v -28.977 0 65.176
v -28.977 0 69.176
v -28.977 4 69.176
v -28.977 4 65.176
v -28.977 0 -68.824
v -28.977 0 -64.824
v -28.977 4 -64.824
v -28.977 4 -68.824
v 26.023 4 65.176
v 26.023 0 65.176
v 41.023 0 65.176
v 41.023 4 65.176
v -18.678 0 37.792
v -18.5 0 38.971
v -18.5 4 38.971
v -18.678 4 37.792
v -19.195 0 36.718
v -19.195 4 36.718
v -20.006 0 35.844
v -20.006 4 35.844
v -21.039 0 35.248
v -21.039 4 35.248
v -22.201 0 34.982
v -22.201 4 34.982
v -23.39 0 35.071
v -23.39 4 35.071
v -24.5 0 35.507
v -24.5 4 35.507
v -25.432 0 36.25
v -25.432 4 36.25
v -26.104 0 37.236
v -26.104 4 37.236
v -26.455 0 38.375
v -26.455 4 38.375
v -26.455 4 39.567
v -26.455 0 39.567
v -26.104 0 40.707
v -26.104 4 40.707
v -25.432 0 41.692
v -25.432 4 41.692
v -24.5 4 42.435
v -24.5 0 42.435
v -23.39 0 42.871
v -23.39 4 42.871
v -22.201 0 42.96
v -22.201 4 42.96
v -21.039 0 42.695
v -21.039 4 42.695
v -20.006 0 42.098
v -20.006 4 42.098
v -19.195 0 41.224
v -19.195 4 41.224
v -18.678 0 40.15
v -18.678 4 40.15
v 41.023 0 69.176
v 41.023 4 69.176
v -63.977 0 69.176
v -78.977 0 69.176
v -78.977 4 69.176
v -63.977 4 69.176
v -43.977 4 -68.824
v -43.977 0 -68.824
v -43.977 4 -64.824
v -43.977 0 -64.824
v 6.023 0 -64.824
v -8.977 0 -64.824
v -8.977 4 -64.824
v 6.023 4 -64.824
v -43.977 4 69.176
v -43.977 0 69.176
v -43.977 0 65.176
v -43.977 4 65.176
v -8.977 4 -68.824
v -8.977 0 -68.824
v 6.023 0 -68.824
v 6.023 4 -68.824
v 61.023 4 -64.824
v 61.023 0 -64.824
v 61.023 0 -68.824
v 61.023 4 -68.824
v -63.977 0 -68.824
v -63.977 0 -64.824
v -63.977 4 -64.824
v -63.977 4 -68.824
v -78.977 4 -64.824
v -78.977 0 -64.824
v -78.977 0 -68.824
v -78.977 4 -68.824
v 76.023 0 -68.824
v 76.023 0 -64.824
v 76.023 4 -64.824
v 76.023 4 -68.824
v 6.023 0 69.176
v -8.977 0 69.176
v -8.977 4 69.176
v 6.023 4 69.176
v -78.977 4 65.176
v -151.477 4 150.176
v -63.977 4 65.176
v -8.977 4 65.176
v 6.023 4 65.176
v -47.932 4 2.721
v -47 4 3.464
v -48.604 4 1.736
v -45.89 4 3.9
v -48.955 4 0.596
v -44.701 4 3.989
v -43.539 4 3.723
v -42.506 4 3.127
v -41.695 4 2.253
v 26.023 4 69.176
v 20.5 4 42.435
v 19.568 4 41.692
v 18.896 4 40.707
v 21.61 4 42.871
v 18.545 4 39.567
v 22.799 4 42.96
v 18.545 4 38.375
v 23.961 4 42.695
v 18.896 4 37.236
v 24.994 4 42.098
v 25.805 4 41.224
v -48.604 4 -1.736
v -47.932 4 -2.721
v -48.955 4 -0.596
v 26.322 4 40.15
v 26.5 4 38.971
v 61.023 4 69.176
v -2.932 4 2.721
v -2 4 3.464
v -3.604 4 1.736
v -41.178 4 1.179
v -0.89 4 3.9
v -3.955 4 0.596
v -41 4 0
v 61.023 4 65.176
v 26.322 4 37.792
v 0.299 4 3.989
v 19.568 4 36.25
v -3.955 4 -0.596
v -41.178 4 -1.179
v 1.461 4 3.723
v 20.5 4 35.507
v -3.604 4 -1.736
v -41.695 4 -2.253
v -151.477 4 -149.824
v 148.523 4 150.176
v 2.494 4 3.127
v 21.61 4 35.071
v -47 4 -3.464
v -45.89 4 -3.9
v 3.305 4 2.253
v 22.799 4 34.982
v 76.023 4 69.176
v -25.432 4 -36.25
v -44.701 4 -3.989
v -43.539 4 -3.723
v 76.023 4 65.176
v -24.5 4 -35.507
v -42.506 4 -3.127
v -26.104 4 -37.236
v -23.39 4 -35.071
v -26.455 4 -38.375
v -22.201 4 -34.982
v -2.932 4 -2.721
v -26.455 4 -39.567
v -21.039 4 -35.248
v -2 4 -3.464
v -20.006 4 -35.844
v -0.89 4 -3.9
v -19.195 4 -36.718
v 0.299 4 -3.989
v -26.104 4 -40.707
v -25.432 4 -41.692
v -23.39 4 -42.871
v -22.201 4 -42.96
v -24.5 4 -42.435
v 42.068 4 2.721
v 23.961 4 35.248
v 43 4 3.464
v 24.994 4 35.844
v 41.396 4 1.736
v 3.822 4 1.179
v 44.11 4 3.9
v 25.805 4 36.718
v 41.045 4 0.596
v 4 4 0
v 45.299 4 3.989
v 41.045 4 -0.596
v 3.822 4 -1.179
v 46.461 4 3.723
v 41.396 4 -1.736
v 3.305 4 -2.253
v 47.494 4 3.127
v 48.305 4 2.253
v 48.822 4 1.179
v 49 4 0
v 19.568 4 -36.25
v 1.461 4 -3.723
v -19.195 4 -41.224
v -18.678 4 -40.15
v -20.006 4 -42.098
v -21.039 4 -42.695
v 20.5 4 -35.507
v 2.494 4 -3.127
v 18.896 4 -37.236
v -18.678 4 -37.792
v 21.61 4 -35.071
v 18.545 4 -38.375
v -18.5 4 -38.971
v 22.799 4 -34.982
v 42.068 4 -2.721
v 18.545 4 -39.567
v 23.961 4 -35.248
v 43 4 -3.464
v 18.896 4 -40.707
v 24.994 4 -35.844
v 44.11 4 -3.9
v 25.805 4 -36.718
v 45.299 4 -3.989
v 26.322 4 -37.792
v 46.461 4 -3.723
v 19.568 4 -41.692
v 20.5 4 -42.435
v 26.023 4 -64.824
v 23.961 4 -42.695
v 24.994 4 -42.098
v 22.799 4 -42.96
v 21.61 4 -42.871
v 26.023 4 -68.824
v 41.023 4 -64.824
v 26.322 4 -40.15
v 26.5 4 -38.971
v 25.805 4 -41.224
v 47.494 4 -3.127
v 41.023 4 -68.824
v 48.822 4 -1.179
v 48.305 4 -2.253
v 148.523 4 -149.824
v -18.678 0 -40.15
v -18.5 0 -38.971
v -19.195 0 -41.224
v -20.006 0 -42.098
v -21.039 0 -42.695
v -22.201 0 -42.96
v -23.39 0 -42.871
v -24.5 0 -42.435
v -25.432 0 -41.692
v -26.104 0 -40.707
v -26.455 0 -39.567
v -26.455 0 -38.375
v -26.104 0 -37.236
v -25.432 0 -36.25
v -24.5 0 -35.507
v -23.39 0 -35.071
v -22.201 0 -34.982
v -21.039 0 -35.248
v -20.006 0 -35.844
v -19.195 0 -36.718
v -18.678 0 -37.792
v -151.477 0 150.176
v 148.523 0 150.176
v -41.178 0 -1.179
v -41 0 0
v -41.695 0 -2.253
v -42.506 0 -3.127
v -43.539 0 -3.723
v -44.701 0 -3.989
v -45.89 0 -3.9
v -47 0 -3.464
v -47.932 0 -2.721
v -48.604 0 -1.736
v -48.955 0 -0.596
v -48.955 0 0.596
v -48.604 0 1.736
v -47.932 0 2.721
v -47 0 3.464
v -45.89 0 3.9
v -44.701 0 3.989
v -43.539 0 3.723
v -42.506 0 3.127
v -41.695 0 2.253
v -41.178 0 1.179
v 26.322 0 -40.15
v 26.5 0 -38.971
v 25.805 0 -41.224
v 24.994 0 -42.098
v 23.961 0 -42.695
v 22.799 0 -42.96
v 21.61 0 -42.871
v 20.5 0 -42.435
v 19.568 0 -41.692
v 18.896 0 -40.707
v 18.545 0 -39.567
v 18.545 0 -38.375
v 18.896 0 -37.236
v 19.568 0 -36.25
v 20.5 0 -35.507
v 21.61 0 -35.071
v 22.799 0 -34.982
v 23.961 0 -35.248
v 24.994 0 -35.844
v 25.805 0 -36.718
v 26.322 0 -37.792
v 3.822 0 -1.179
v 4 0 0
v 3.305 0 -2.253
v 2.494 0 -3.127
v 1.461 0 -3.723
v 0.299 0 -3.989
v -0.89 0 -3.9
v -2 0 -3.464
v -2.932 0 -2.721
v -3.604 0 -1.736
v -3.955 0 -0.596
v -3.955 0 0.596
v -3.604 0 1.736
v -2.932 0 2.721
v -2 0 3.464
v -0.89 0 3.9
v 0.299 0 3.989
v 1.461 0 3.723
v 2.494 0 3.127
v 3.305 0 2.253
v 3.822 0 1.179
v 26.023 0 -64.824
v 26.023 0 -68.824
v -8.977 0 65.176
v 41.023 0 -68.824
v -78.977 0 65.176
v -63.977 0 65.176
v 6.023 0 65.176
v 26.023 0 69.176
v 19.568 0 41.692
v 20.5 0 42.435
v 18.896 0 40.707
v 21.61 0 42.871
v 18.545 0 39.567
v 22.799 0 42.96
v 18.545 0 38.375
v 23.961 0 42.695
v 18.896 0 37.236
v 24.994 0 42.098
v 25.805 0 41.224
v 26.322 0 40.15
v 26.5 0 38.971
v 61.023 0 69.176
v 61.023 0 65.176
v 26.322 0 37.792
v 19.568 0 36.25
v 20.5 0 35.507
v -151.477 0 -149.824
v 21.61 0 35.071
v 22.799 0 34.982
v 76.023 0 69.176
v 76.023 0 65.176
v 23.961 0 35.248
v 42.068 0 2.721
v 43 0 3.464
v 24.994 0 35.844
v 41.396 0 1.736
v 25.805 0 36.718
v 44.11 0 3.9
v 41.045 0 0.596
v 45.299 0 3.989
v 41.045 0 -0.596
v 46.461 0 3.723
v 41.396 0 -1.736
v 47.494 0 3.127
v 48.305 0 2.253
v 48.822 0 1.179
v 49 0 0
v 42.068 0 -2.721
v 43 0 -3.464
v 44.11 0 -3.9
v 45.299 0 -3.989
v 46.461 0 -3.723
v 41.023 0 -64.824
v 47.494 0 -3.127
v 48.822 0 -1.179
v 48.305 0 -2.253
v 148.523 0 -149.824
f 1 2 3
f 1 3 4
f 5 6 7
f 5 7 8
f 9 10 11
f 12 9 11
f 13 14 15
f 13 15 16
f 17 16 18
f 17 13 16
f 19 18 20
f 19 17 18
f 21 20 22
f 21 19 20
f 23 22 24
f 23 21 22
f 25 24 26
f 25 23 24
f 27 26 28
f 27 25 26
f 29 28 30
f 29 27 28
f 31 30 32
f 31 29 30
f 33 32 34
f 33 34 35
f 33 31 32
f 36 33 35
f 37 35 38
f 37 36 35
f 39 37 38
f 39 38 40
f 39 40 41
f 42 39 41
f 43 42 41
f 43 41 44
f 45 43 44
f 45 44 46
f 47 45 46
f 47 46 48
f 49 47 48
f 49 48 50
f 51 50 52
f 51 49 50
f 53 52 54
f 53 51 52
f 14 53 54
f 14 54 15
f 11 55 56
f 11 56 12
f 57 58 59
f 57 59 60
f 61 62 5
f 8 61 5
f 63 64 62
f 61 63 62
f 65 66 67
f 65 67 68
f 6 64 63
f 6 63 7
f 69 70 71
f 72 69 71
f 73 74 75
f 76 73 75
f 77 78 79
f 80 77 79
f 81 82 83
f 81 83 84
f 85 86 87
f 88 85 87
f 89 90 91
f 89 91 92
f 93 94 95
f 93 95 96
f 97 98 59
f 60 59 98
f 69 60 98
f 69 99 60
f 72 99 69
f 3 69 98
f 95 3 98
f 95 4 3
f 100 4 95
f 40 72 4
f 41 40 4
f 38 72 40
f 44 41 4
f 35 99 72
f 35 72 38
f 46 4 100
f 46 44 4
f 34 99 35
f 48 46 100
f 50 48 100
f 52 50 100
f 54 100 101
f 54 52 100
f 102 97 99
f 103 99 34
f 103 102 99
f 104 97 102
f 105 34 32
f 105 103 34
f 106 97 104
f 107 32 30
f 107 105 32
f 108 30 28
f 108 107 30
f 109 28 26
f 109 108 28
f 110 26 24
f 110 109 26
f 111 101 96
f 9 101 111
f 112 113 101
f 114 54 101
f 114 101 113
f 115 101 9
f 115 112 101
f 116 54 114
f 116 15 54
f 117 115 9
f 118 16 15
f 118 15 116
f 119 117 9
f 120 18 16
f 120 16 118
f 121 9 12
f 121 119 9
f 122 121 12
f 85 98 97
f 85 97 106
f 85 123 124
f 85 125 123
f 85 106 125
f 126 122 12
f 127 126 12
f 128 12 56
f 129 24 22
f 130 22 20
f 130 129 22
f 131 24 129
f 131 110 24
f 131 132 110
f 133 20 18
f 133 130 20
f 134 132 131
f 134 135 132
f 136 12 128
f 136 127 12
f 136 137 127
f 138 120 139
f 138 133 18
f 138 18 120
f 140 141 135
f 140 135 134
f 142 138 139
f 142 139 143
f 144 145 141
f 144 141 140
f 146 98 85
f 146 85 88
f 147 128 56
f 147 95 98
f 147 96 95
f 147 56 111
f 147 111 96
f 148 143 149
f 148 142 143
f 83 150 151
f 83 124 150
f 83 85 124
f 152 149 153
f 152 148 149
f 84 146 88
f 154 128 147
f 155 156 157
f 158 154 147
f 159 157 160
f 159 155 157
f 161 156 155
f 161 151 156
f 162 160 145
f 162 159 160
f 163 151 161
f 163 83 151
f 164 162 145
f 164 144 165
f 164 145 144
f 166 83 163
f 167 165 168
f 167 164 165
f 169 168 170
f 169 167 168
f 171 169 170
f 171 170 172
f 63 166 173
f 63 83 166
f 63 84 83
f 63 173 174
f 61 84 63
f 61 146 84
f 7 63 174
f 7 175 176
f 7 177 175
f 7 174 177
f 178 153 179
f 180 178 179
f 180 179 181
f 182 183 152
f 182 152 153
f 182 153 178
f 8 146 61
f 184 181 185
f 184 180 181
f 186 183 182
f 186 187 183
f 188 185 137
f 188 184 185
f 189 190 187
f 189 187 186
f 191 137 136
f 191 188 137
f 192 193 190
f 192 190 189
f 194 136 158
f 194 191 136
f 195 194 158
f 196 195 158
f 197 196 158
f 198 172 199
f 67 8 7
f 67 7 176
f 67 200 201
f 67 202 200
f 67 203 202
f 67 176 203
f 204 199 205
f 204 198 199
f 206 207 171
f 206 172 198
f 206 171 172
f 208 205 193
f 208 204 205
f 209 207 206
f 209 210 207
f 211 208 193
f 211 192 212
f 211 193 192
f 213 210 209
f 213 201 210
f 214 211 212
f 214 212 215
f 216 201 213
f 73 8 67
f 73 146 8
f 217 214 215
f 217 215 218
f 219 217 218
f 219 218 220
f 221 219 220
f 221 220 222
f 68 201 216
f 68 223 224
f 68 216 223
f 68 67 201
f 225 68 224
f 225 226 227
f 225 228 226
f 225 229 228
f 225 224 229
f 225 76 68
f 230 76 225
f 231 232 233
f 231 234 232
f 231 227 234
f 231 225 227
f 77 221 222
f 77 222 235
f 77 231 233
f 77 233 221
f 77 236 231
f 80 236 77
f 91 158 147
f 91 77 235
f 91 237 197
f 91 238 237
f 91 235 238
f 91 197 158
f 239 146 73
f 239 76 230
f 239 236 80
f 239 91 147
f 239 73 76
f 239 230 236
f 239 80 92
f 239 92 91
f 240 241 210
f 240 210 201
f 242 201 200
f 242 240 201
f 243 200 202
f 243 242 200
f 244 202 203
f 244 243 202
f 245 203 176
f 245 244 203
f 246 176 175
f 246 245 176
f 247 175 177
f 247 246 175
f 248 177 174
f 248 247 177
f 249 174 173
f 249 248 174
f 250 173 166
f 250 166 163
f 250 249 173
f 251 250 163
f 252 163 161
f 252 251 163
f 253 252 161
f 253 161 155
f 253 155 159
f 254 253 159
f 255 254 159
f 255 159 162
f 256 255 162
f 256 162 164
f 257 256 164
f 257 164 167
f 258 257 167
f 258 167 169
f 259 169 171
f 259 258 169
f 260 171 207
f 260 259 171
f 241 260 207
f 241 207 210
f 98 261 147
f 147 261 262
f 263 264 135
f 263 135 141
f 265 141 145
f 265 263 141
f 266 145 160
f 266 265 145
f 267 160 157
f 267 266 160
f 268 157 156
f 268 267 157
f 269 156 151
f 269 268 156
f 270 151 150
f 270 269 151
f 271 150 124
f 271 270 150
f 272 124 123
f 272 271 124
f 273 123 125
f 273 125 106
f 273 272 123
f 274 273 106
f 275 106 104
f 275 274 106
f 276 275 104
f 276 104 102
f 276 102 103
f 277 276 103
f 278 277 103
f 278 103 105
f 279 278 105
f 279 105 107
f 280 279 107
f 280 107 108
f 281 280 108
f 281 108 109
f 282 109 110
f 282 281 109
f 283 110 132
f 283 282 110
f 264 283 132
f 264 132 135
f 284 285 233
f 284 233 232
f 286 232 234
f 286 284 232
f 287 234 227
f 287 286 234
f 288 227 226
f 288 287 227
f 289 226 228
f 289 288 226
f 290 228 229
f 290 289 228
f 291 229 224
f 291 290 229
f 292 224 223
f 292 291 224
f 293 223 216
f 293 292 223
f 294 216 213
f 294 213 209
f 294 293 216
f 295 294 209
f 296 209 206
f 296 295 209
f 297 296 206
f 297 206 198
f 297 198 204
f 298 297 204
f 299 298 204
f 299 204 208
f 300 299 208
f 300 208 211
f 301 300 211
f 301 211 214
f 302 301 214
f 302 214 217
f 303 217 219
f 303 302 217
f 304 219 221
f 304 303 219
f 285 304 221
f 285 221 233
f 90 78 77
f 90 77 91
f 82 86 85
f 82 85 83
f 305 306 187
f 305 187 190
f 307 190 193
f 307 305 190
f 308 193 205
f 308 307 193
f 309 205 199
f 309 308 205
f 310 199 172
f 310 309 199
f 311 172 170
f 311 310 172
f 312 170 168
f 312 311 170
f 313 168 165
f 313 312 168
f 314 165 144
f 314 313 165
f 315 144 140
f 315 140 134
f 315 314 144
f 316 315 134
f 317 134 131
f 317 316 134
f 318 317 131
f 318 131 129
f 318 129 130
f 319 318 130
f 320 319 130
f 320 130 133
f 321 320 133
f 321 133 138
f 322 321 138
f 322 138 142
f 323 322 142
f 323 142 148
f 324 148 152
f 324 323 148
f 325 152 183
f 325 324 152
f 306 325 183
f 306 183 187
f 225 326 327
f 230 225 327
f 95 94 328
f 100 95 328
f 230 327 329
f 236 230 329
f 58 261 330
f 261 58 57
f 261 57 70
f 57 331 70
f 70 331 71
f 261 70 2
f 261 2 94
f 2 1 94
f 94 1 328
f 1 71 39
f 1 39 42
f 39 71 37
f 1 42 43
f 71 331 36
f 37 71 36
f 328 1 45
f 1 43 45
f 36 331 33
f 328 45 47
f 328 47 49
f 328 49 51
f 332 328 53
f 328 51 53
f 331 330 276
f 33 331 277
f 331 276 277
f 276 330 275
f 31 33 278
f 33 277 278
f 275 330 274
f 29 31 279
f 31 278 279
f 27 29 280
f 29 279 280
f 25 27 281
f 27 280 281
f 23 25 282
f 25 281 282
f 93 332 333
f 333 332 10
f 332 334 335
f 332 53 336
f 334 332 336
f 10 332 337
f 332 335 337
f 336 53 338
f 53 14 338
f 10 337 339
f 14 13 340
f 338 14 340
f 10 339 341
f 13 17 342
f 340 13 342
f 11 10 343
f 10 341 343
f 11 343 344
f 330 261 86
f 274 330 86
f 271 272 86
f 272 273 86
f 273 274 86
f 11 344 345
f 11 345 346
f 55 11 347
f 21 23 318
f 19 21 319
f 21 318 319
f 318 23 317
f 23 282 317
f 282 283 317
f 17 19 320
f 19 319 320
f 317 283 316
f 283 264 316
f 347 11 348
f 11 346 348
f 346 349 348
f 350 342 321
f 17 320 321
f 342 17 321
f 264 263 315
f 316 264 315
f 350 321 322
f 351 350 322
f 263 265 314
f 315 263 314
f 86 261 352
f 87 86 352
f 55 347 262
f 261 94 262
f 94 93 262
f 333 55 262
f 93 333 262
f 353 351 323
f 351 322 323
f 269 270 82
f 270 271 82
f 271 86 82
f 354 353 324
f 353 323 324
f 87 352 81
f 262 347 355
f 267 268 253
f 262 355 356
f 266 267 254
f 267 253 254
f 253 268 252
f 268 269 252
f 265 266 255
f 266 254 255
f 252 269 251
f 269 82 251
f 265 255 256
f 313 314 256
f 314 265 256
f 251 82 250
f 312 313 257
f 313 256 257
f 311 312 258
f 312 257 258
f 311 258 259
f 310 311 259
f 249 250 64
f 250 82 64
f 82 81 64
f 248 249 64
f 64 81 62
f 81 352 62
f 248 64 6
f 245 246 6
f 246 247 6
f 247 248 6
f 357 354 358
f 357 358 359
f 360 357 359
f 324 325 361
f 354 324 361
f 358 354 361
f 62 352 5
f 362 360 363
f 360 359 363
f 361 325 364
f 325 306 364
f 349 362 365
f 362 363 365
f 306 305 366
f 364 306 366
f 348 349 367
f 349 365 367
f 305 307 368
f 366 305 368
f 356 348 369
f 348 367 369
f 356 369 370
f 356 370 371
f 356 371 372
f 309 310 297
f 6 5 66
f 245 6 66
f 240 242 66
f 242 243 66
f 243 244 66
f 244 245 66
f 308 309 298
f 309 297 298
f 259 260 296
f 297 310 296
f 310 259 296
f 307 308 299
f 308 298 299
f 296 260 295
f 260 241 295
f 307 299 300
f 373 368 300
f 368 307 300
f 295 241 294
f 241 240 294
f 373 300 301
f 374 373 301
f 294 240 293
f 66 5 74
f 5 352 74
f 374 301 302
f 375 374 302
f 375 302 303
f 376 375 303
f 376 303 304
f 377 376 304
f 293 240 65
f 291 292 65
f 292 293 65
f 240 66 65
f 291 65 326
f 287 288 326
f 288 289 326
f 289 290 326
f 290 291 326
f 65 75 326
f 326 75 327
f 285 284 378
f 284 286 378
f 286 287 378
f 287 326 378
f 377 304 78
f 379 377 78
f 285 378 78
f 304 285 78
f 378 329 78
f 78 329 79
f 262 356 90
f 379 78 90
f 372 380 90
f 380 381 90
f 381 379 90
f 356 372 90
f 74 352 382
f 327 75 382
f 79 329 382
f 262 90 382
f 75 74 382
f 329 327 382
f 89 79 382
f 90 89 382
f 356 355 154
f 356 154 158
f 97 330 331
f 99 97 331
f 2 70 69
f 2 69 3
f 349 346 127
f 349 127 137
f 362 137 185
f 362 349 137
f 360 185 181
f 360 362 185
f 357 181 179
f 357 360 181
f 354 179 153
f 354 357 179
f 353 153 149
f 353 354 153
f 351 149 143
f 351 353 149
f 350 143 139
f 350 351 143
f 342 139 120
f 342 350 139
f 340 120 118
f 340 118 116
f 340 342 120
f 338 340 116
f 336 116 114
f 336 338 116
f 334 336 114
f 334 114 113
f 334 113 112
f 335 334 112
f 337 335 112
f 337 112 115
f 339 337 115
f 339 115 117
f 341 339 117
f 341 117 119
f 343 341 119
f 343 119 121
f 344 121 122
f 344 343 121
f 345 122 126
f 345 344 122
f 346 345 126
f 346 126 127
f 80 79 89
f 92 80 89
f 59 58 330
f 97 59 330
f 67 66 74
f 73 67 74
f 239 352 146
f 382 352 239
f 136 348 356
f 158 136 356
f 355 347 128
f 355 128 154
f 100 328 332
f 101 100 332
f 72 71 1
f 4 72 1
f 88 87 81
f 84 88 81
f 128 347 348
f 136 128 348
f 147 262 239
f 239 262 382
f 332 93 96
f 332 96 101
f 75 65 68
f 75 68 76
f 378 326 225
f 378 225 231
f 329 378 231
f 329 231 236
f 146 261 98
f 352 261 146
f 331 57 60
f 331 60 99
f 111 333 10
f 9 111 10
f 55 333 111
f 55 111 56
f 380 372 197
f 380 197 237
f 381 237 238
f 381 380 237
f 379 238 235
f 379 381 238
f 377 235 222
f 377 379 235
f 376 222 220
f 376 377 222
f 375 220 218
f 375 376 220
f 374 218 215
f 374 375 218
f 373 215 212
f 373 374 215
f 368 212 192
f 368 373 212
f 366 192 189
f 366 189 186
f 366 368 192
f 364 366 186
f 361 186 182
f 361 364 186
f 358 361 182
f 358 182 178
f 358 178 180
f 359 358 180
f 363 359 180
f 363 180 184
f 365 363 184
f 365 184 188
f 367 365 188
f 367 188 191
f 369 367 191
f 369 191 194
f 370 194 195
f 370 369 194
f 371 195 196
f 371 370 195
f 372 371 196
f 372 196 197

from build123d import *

# Parameters (mm, degrees)
SKETCH1_W           = 300
SKETCH1_H           = 300
SKETCH1_R           = 4
SKETCH1_W_2         = 15
SKETCH1_H_2         = 4
BOSS_EXTRUDE1_DEPTH = 4


with BuildPart() as part:
    # Sketch1 → Boss-Extrude1 (new body)
    with BuildSketch(Plane(origin=(0, 0, 0), x_dir=(1, 0, 0), z_dir=(0, 1, 0))):
        with Locations((-1.47665027, -0.17639355)):
            Rectangle(SKETCH1_W, SKETCH1_H)
        with Locations((-1e-09, 3e-09)):
            Circle(SKETCH1_R, mode=Mode.SUBTRACT)
        with Locations((44.999999999, 3e-09)):
            Circle(SKETCH1_R, mode=Mode.SUBTRACT)
        with Locations((22.499999999, 38.971143173)):
            Circle(SKETCH1_R, mode=Mode.SUBTRACT)
        with Locations((-22.500000001, 38.971143173)):
            Circle(SKETCH1_R, mode=Mode.SUBTRACT)
        with Locations((-45.000000001, 3e-09)):
            Circle(SKETCH1_R, mode=Mode.SUBTRACT)
        with Locations((-22.500000001, -38.971143168)):
            Circle(SKETCH1_R, mode=Mode.SUBTRACT)
        with Locations((22.499999999, -38.971143168)):
            Circle(SKETCH1_R, mode=Mode.SUBTRACT)
        with Locations((-71.47665027, 66.82360645)):
            Rectangle(SKETCH1_W_2, SKETCH1_H_2, mode=Mode.SUBTRACT)
        with Locations((-36.47665027, 66.82360645)):
            Rectangle(SKETCH1_W_2, SKETCH1_H_2, mode=Mode.SUBTRACT)
        with Locations((-1.47665027, 66.82360645)):
            Rectangle(SKETCH1_W_2, SKETCH1_H_2, mode=Mode.SUBTRACT)
        with Locations((33.52334973, 66.82360645)):
            Rectangle(SKETCH1_W_2, SKETCH1_H_2, mode=Mode.SUBTRACT)
        with Locations((68.52334973, 66.82360645)):
            Rectangle(SKETCH1_W_2, SKETCH1_H_2, mode=Mode.SUBTRACT)
        with Locations((68.52334973, -67.17639355)):
            Rectangle(SKETCH1_W_2, SKETCH1_H_2, mode=Mode.SUBTRACT)
        with Locations((33.52334973, -67.17639355)):
            Rectangle(SKETCH1_W_2, SKETCH1_H_2, mode=Mode.SUBTRACT)
        with Locations((-1.47665027, -67.17639355)):
            Rectangle(SKETCH1_W_2, SKETCH1_H_2, mode=Mode.SUBTRACT)
        with Locations((-36.47665027, -67.17639355)):
            Rectangle(SKETCH1_W_2, SKETCH1_H_2, mode=Mode.SUBTRACT)
        with Locations((-71.47665027, -67.17639355)):
            Rectangle(SKETCH1_W_2, SKETCH1_H_2, mode=Mode.SUBTRACT)
    extrude(amount=BOSS_EXTRUDE1_DEPTH)


solid = part.part
